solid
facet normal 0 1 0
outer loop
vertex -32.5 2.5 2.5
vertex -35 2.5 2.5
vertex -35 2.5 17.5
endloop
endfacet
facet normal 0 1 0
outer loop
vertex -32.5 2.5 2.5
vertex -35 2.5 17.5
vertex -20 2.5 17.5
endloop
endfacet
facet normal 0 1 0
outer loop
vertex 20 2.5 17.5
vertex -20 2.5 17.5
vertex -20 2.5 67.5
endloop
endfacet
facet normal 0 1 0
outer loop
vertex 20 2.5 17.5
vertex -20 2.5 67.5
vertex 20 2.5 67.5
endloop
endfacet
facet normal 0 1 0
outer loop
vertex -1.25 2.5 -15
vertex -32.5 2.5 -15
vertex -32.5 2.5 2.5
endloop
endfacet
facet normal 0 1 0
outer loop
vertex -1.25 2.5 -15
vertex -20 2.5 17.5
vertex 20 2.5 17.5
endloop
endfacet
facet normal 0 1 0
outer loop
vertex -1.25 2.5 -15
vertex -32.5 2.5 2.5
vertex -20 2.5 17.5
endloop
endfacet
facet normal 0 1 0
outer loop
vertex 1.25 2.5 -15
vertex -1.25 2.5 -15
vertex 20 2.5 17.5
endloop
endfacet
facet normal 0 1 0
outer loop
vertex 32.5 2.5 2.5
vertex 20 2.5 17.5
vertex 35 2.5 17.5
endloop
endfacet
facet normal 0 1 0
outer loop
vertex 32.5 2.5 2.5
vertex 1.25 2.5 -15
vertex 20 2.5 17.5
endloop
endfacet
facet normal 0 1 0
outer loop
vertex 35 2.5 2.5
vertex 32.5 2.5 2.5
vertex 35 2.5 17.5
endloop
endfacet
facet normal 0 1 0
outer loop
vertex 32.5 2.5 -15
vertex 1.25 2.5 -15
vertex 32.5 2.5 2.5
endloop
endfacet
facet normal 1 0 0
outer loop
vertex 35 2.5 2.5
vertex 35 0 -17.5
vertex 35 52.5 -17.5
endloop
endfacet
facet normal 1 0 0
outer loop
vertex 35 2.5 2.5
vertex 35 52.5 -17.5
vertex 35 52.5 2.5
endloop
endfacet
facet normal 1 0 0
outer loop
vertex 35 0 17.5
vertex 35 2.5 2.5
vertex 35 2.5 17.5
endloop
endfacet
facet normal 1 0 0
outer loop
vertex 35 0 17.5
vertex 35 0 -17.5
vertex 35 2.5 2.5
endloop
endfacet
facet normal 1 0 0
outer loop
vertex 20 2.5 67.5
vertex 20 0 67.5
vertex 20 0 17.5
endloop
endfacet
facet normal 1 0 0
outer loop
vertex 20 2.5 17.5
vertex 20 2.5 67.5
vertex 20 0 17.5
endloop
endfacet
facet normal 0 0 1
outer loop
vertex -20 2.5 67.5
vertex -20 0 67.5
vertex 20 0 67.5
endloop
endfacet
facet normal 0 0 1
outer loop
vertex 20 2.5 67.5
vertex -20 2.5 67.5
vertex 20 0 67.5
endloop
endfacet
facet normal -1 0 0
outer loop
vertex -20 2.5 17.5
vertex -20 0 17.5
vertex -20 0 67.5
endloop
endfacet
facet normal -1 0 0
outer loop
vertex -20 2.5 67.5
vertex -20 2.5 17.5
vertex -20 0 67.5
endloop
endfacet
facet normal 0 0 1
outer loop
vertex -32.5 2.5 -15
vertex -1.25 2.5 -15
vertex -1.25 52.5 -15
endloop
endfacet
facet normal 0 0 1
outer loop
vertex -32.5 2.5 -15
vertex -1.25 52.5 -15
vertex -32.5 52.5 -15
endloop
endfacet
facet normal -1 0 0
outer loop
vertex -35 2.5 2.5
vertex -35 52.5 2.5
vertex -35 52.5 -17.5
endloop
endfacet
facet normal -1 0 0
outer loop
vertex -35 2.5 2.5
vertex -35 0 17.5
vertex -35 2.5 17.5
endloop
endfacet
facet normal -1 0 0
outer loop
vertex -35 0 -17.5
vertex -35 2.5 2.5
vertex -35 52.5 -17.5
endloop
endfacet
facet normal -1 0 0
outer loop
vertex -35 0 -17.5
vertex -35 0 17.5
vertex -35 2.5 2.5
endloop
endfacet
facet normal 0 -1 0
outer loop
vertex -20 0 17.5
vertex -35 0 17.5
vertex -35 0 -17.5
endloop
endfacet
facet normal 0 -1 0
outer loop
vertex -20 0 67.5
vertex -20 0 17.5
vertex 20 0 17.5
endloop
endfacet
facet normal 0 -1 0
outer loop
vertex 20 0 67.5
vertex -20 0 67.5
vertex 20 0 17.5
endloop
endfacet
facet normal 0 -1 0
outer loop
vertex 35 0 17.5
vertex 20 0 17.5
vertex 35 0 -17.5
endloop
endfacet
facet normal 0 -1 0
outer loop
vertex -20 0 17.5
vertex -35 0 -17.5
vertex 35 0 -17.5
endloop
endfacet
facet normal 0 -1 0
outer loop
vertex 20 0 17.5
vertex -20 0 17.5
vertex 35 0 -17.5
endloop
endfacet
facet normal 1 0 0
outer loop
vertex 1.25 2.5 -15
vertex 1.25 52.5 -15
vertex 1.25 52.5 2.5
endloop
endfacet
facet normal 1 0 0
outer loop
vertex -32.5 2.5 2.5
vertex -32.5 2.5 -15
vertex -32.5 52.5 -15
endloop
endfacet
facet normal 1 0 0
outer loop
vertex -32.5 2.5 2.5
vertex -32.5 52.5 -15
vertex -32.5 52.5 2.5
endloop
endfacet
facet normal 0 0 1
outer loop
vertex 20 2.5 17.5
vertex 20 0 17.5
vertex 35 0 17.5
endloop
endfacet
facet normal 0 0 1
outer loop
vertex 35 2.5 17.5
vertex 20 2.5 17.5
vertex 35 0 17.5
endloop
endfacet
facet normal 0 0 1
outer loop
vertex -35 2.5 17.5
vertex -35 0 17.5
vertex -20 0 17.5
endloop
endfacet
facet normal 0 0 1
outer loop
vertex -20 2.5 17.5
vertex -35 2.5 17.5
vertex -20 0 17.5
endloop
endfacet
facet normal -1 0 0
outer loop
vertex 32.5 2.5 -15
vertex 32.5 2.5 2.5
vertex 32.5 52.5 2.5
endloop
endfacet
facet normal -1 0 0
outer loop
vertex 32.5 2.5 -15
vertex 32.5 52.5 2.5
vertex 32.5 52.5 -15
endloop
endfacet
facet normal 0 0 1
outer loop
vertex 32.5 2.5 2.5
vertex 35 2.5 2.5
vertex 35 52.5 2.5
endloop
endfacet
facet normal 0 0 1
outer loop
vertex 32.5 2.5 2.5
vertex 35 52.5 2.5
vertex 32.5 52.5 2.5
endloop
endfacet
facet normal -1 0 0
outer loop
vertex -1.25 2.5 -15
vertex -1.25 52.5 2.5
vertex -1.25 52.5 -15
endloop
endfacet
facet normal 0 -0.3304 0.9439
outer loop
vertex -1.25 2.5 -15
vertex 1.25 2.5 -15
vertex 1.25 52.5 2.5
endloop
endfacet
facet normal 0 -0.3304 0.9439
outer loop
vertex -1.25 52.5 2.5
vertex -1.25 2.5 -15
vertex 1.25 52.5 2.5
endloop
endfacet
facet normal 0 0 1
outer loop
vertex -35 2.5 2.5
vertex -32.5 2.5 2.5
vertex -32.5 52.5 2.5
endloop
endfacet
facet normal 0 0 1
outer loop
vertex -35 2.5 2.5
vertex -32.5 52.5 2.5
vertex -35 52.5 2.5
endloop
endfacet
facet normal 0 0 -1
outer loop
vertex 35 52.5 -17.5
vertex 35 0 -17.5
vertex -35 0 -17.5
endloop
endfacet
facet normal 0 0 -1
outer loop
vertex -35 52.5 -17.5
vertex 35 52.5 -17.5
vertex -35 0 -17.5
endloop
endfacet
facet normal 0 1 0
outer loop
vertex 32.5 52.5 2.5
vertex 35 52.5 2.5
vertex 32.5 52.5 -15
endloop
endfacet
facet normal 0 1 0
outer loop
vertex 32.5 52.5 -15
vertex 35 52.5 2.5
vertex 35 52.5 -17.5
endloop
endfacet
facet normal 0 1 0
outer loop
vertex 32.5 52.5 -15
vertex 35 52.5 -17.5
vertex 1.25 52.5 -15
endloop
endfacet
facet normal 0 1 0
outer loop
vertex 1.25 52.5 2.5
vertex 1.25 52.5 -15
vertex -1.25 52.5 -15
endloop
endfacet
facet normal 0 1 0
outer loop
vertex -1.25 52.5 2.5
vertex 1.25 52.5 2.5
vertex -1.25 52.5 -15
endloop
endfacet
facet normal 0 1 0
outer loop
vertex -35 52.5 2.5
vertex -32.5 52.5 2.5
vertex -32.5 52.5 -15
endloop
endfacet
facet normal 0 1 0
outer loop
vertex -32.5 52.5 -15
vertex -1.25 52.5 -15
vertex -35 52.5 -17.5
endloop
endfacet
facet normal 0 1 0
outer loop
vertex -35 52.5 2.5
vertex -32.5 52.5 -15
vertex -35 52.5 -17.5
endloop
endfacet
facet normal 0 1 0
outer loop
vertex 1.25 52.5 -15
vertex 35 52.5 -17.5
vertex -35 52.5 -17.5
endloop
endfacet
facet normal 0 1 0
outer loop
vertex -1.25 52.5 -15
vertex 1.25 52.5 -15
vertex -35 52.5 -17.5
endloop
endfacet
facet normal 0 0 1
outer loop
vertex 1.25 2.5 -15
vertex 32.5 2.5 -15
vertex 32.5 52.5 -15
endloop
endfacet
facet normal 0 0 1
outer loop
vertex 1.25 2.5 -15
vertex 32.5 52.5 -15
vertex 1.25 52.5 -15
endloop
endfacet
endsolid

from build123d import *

# Parameters (mm, degrees)
BOSS_EXTRUDE1_DEPTH = 2.5
BOSS_EXTRUDE2_DEPTH = 50
CUT_EXTRUDE1_REACH  = 94.879


with BuildPart() as part:
    # Sketch1 → Boss-Extrude1 (new body)
    with BuildSketch(Plane(origin=(0, 0, 0), x_dir=(1, 0, 0), z_dir=(0, 1, 0))):
        Polygon((20, -17.5), (35, -17.5), (35, 17.5), (-35, 17.5), (-35, -17.5), (-20, -17.5), (-20, -67.5), (20, -67.5), align=None)
    extrude(amount=BOSS_EXTRUDE1_DEPTH)

    # Sketch3 → Boss-Extrude2 (add)
    with BuildSketch(Plane(origin=(0, 2.5, 0), x_dir=(1, 0, 0), z_dir=(0, 1, 0))):
        Polygon((-35, 17.5), (-32.5, 17.5), (32.5, 17.5), (35, 17.5), (35, -2.5), (32.5, -2.5), (32.5, 15), (1.25, 15), (1.25, -2.5), (-1.25, -2.5), (-1.25, 15), (-32.5, 15), (-32.5, -2.5), (-35, -2.5), align=None)
    extrude(amount=BOSS_EXTRUDE2_DEPTH)

    # Sketch4 → Cut-Extrude1 (cut, up to next)
    with BuildSketch(Plane(origin=(1.25, 0, 0), x_dir=(0, 0, -1), z_dir=(1, 0, 0)), mode=Mode.PRIVATE) as cut_extrude1_sk1:
        Polygon((15, 2.5), (-2.5, 52.5), (-2.5, 2.5), align=None)
    cut_extrude1_tool1 = extrude(cut_extrude1_sk1.sketch, amount=-CUT_EXTRUDE1_REACH, mode=Mode.PRIVATE) & part.part
    add(cut_extrude1_tool1.solids().sort_by_distance((1.25, 19.166667, -3.333333))[0], mode=Mode.SUBTRACT)


solid = part.part
